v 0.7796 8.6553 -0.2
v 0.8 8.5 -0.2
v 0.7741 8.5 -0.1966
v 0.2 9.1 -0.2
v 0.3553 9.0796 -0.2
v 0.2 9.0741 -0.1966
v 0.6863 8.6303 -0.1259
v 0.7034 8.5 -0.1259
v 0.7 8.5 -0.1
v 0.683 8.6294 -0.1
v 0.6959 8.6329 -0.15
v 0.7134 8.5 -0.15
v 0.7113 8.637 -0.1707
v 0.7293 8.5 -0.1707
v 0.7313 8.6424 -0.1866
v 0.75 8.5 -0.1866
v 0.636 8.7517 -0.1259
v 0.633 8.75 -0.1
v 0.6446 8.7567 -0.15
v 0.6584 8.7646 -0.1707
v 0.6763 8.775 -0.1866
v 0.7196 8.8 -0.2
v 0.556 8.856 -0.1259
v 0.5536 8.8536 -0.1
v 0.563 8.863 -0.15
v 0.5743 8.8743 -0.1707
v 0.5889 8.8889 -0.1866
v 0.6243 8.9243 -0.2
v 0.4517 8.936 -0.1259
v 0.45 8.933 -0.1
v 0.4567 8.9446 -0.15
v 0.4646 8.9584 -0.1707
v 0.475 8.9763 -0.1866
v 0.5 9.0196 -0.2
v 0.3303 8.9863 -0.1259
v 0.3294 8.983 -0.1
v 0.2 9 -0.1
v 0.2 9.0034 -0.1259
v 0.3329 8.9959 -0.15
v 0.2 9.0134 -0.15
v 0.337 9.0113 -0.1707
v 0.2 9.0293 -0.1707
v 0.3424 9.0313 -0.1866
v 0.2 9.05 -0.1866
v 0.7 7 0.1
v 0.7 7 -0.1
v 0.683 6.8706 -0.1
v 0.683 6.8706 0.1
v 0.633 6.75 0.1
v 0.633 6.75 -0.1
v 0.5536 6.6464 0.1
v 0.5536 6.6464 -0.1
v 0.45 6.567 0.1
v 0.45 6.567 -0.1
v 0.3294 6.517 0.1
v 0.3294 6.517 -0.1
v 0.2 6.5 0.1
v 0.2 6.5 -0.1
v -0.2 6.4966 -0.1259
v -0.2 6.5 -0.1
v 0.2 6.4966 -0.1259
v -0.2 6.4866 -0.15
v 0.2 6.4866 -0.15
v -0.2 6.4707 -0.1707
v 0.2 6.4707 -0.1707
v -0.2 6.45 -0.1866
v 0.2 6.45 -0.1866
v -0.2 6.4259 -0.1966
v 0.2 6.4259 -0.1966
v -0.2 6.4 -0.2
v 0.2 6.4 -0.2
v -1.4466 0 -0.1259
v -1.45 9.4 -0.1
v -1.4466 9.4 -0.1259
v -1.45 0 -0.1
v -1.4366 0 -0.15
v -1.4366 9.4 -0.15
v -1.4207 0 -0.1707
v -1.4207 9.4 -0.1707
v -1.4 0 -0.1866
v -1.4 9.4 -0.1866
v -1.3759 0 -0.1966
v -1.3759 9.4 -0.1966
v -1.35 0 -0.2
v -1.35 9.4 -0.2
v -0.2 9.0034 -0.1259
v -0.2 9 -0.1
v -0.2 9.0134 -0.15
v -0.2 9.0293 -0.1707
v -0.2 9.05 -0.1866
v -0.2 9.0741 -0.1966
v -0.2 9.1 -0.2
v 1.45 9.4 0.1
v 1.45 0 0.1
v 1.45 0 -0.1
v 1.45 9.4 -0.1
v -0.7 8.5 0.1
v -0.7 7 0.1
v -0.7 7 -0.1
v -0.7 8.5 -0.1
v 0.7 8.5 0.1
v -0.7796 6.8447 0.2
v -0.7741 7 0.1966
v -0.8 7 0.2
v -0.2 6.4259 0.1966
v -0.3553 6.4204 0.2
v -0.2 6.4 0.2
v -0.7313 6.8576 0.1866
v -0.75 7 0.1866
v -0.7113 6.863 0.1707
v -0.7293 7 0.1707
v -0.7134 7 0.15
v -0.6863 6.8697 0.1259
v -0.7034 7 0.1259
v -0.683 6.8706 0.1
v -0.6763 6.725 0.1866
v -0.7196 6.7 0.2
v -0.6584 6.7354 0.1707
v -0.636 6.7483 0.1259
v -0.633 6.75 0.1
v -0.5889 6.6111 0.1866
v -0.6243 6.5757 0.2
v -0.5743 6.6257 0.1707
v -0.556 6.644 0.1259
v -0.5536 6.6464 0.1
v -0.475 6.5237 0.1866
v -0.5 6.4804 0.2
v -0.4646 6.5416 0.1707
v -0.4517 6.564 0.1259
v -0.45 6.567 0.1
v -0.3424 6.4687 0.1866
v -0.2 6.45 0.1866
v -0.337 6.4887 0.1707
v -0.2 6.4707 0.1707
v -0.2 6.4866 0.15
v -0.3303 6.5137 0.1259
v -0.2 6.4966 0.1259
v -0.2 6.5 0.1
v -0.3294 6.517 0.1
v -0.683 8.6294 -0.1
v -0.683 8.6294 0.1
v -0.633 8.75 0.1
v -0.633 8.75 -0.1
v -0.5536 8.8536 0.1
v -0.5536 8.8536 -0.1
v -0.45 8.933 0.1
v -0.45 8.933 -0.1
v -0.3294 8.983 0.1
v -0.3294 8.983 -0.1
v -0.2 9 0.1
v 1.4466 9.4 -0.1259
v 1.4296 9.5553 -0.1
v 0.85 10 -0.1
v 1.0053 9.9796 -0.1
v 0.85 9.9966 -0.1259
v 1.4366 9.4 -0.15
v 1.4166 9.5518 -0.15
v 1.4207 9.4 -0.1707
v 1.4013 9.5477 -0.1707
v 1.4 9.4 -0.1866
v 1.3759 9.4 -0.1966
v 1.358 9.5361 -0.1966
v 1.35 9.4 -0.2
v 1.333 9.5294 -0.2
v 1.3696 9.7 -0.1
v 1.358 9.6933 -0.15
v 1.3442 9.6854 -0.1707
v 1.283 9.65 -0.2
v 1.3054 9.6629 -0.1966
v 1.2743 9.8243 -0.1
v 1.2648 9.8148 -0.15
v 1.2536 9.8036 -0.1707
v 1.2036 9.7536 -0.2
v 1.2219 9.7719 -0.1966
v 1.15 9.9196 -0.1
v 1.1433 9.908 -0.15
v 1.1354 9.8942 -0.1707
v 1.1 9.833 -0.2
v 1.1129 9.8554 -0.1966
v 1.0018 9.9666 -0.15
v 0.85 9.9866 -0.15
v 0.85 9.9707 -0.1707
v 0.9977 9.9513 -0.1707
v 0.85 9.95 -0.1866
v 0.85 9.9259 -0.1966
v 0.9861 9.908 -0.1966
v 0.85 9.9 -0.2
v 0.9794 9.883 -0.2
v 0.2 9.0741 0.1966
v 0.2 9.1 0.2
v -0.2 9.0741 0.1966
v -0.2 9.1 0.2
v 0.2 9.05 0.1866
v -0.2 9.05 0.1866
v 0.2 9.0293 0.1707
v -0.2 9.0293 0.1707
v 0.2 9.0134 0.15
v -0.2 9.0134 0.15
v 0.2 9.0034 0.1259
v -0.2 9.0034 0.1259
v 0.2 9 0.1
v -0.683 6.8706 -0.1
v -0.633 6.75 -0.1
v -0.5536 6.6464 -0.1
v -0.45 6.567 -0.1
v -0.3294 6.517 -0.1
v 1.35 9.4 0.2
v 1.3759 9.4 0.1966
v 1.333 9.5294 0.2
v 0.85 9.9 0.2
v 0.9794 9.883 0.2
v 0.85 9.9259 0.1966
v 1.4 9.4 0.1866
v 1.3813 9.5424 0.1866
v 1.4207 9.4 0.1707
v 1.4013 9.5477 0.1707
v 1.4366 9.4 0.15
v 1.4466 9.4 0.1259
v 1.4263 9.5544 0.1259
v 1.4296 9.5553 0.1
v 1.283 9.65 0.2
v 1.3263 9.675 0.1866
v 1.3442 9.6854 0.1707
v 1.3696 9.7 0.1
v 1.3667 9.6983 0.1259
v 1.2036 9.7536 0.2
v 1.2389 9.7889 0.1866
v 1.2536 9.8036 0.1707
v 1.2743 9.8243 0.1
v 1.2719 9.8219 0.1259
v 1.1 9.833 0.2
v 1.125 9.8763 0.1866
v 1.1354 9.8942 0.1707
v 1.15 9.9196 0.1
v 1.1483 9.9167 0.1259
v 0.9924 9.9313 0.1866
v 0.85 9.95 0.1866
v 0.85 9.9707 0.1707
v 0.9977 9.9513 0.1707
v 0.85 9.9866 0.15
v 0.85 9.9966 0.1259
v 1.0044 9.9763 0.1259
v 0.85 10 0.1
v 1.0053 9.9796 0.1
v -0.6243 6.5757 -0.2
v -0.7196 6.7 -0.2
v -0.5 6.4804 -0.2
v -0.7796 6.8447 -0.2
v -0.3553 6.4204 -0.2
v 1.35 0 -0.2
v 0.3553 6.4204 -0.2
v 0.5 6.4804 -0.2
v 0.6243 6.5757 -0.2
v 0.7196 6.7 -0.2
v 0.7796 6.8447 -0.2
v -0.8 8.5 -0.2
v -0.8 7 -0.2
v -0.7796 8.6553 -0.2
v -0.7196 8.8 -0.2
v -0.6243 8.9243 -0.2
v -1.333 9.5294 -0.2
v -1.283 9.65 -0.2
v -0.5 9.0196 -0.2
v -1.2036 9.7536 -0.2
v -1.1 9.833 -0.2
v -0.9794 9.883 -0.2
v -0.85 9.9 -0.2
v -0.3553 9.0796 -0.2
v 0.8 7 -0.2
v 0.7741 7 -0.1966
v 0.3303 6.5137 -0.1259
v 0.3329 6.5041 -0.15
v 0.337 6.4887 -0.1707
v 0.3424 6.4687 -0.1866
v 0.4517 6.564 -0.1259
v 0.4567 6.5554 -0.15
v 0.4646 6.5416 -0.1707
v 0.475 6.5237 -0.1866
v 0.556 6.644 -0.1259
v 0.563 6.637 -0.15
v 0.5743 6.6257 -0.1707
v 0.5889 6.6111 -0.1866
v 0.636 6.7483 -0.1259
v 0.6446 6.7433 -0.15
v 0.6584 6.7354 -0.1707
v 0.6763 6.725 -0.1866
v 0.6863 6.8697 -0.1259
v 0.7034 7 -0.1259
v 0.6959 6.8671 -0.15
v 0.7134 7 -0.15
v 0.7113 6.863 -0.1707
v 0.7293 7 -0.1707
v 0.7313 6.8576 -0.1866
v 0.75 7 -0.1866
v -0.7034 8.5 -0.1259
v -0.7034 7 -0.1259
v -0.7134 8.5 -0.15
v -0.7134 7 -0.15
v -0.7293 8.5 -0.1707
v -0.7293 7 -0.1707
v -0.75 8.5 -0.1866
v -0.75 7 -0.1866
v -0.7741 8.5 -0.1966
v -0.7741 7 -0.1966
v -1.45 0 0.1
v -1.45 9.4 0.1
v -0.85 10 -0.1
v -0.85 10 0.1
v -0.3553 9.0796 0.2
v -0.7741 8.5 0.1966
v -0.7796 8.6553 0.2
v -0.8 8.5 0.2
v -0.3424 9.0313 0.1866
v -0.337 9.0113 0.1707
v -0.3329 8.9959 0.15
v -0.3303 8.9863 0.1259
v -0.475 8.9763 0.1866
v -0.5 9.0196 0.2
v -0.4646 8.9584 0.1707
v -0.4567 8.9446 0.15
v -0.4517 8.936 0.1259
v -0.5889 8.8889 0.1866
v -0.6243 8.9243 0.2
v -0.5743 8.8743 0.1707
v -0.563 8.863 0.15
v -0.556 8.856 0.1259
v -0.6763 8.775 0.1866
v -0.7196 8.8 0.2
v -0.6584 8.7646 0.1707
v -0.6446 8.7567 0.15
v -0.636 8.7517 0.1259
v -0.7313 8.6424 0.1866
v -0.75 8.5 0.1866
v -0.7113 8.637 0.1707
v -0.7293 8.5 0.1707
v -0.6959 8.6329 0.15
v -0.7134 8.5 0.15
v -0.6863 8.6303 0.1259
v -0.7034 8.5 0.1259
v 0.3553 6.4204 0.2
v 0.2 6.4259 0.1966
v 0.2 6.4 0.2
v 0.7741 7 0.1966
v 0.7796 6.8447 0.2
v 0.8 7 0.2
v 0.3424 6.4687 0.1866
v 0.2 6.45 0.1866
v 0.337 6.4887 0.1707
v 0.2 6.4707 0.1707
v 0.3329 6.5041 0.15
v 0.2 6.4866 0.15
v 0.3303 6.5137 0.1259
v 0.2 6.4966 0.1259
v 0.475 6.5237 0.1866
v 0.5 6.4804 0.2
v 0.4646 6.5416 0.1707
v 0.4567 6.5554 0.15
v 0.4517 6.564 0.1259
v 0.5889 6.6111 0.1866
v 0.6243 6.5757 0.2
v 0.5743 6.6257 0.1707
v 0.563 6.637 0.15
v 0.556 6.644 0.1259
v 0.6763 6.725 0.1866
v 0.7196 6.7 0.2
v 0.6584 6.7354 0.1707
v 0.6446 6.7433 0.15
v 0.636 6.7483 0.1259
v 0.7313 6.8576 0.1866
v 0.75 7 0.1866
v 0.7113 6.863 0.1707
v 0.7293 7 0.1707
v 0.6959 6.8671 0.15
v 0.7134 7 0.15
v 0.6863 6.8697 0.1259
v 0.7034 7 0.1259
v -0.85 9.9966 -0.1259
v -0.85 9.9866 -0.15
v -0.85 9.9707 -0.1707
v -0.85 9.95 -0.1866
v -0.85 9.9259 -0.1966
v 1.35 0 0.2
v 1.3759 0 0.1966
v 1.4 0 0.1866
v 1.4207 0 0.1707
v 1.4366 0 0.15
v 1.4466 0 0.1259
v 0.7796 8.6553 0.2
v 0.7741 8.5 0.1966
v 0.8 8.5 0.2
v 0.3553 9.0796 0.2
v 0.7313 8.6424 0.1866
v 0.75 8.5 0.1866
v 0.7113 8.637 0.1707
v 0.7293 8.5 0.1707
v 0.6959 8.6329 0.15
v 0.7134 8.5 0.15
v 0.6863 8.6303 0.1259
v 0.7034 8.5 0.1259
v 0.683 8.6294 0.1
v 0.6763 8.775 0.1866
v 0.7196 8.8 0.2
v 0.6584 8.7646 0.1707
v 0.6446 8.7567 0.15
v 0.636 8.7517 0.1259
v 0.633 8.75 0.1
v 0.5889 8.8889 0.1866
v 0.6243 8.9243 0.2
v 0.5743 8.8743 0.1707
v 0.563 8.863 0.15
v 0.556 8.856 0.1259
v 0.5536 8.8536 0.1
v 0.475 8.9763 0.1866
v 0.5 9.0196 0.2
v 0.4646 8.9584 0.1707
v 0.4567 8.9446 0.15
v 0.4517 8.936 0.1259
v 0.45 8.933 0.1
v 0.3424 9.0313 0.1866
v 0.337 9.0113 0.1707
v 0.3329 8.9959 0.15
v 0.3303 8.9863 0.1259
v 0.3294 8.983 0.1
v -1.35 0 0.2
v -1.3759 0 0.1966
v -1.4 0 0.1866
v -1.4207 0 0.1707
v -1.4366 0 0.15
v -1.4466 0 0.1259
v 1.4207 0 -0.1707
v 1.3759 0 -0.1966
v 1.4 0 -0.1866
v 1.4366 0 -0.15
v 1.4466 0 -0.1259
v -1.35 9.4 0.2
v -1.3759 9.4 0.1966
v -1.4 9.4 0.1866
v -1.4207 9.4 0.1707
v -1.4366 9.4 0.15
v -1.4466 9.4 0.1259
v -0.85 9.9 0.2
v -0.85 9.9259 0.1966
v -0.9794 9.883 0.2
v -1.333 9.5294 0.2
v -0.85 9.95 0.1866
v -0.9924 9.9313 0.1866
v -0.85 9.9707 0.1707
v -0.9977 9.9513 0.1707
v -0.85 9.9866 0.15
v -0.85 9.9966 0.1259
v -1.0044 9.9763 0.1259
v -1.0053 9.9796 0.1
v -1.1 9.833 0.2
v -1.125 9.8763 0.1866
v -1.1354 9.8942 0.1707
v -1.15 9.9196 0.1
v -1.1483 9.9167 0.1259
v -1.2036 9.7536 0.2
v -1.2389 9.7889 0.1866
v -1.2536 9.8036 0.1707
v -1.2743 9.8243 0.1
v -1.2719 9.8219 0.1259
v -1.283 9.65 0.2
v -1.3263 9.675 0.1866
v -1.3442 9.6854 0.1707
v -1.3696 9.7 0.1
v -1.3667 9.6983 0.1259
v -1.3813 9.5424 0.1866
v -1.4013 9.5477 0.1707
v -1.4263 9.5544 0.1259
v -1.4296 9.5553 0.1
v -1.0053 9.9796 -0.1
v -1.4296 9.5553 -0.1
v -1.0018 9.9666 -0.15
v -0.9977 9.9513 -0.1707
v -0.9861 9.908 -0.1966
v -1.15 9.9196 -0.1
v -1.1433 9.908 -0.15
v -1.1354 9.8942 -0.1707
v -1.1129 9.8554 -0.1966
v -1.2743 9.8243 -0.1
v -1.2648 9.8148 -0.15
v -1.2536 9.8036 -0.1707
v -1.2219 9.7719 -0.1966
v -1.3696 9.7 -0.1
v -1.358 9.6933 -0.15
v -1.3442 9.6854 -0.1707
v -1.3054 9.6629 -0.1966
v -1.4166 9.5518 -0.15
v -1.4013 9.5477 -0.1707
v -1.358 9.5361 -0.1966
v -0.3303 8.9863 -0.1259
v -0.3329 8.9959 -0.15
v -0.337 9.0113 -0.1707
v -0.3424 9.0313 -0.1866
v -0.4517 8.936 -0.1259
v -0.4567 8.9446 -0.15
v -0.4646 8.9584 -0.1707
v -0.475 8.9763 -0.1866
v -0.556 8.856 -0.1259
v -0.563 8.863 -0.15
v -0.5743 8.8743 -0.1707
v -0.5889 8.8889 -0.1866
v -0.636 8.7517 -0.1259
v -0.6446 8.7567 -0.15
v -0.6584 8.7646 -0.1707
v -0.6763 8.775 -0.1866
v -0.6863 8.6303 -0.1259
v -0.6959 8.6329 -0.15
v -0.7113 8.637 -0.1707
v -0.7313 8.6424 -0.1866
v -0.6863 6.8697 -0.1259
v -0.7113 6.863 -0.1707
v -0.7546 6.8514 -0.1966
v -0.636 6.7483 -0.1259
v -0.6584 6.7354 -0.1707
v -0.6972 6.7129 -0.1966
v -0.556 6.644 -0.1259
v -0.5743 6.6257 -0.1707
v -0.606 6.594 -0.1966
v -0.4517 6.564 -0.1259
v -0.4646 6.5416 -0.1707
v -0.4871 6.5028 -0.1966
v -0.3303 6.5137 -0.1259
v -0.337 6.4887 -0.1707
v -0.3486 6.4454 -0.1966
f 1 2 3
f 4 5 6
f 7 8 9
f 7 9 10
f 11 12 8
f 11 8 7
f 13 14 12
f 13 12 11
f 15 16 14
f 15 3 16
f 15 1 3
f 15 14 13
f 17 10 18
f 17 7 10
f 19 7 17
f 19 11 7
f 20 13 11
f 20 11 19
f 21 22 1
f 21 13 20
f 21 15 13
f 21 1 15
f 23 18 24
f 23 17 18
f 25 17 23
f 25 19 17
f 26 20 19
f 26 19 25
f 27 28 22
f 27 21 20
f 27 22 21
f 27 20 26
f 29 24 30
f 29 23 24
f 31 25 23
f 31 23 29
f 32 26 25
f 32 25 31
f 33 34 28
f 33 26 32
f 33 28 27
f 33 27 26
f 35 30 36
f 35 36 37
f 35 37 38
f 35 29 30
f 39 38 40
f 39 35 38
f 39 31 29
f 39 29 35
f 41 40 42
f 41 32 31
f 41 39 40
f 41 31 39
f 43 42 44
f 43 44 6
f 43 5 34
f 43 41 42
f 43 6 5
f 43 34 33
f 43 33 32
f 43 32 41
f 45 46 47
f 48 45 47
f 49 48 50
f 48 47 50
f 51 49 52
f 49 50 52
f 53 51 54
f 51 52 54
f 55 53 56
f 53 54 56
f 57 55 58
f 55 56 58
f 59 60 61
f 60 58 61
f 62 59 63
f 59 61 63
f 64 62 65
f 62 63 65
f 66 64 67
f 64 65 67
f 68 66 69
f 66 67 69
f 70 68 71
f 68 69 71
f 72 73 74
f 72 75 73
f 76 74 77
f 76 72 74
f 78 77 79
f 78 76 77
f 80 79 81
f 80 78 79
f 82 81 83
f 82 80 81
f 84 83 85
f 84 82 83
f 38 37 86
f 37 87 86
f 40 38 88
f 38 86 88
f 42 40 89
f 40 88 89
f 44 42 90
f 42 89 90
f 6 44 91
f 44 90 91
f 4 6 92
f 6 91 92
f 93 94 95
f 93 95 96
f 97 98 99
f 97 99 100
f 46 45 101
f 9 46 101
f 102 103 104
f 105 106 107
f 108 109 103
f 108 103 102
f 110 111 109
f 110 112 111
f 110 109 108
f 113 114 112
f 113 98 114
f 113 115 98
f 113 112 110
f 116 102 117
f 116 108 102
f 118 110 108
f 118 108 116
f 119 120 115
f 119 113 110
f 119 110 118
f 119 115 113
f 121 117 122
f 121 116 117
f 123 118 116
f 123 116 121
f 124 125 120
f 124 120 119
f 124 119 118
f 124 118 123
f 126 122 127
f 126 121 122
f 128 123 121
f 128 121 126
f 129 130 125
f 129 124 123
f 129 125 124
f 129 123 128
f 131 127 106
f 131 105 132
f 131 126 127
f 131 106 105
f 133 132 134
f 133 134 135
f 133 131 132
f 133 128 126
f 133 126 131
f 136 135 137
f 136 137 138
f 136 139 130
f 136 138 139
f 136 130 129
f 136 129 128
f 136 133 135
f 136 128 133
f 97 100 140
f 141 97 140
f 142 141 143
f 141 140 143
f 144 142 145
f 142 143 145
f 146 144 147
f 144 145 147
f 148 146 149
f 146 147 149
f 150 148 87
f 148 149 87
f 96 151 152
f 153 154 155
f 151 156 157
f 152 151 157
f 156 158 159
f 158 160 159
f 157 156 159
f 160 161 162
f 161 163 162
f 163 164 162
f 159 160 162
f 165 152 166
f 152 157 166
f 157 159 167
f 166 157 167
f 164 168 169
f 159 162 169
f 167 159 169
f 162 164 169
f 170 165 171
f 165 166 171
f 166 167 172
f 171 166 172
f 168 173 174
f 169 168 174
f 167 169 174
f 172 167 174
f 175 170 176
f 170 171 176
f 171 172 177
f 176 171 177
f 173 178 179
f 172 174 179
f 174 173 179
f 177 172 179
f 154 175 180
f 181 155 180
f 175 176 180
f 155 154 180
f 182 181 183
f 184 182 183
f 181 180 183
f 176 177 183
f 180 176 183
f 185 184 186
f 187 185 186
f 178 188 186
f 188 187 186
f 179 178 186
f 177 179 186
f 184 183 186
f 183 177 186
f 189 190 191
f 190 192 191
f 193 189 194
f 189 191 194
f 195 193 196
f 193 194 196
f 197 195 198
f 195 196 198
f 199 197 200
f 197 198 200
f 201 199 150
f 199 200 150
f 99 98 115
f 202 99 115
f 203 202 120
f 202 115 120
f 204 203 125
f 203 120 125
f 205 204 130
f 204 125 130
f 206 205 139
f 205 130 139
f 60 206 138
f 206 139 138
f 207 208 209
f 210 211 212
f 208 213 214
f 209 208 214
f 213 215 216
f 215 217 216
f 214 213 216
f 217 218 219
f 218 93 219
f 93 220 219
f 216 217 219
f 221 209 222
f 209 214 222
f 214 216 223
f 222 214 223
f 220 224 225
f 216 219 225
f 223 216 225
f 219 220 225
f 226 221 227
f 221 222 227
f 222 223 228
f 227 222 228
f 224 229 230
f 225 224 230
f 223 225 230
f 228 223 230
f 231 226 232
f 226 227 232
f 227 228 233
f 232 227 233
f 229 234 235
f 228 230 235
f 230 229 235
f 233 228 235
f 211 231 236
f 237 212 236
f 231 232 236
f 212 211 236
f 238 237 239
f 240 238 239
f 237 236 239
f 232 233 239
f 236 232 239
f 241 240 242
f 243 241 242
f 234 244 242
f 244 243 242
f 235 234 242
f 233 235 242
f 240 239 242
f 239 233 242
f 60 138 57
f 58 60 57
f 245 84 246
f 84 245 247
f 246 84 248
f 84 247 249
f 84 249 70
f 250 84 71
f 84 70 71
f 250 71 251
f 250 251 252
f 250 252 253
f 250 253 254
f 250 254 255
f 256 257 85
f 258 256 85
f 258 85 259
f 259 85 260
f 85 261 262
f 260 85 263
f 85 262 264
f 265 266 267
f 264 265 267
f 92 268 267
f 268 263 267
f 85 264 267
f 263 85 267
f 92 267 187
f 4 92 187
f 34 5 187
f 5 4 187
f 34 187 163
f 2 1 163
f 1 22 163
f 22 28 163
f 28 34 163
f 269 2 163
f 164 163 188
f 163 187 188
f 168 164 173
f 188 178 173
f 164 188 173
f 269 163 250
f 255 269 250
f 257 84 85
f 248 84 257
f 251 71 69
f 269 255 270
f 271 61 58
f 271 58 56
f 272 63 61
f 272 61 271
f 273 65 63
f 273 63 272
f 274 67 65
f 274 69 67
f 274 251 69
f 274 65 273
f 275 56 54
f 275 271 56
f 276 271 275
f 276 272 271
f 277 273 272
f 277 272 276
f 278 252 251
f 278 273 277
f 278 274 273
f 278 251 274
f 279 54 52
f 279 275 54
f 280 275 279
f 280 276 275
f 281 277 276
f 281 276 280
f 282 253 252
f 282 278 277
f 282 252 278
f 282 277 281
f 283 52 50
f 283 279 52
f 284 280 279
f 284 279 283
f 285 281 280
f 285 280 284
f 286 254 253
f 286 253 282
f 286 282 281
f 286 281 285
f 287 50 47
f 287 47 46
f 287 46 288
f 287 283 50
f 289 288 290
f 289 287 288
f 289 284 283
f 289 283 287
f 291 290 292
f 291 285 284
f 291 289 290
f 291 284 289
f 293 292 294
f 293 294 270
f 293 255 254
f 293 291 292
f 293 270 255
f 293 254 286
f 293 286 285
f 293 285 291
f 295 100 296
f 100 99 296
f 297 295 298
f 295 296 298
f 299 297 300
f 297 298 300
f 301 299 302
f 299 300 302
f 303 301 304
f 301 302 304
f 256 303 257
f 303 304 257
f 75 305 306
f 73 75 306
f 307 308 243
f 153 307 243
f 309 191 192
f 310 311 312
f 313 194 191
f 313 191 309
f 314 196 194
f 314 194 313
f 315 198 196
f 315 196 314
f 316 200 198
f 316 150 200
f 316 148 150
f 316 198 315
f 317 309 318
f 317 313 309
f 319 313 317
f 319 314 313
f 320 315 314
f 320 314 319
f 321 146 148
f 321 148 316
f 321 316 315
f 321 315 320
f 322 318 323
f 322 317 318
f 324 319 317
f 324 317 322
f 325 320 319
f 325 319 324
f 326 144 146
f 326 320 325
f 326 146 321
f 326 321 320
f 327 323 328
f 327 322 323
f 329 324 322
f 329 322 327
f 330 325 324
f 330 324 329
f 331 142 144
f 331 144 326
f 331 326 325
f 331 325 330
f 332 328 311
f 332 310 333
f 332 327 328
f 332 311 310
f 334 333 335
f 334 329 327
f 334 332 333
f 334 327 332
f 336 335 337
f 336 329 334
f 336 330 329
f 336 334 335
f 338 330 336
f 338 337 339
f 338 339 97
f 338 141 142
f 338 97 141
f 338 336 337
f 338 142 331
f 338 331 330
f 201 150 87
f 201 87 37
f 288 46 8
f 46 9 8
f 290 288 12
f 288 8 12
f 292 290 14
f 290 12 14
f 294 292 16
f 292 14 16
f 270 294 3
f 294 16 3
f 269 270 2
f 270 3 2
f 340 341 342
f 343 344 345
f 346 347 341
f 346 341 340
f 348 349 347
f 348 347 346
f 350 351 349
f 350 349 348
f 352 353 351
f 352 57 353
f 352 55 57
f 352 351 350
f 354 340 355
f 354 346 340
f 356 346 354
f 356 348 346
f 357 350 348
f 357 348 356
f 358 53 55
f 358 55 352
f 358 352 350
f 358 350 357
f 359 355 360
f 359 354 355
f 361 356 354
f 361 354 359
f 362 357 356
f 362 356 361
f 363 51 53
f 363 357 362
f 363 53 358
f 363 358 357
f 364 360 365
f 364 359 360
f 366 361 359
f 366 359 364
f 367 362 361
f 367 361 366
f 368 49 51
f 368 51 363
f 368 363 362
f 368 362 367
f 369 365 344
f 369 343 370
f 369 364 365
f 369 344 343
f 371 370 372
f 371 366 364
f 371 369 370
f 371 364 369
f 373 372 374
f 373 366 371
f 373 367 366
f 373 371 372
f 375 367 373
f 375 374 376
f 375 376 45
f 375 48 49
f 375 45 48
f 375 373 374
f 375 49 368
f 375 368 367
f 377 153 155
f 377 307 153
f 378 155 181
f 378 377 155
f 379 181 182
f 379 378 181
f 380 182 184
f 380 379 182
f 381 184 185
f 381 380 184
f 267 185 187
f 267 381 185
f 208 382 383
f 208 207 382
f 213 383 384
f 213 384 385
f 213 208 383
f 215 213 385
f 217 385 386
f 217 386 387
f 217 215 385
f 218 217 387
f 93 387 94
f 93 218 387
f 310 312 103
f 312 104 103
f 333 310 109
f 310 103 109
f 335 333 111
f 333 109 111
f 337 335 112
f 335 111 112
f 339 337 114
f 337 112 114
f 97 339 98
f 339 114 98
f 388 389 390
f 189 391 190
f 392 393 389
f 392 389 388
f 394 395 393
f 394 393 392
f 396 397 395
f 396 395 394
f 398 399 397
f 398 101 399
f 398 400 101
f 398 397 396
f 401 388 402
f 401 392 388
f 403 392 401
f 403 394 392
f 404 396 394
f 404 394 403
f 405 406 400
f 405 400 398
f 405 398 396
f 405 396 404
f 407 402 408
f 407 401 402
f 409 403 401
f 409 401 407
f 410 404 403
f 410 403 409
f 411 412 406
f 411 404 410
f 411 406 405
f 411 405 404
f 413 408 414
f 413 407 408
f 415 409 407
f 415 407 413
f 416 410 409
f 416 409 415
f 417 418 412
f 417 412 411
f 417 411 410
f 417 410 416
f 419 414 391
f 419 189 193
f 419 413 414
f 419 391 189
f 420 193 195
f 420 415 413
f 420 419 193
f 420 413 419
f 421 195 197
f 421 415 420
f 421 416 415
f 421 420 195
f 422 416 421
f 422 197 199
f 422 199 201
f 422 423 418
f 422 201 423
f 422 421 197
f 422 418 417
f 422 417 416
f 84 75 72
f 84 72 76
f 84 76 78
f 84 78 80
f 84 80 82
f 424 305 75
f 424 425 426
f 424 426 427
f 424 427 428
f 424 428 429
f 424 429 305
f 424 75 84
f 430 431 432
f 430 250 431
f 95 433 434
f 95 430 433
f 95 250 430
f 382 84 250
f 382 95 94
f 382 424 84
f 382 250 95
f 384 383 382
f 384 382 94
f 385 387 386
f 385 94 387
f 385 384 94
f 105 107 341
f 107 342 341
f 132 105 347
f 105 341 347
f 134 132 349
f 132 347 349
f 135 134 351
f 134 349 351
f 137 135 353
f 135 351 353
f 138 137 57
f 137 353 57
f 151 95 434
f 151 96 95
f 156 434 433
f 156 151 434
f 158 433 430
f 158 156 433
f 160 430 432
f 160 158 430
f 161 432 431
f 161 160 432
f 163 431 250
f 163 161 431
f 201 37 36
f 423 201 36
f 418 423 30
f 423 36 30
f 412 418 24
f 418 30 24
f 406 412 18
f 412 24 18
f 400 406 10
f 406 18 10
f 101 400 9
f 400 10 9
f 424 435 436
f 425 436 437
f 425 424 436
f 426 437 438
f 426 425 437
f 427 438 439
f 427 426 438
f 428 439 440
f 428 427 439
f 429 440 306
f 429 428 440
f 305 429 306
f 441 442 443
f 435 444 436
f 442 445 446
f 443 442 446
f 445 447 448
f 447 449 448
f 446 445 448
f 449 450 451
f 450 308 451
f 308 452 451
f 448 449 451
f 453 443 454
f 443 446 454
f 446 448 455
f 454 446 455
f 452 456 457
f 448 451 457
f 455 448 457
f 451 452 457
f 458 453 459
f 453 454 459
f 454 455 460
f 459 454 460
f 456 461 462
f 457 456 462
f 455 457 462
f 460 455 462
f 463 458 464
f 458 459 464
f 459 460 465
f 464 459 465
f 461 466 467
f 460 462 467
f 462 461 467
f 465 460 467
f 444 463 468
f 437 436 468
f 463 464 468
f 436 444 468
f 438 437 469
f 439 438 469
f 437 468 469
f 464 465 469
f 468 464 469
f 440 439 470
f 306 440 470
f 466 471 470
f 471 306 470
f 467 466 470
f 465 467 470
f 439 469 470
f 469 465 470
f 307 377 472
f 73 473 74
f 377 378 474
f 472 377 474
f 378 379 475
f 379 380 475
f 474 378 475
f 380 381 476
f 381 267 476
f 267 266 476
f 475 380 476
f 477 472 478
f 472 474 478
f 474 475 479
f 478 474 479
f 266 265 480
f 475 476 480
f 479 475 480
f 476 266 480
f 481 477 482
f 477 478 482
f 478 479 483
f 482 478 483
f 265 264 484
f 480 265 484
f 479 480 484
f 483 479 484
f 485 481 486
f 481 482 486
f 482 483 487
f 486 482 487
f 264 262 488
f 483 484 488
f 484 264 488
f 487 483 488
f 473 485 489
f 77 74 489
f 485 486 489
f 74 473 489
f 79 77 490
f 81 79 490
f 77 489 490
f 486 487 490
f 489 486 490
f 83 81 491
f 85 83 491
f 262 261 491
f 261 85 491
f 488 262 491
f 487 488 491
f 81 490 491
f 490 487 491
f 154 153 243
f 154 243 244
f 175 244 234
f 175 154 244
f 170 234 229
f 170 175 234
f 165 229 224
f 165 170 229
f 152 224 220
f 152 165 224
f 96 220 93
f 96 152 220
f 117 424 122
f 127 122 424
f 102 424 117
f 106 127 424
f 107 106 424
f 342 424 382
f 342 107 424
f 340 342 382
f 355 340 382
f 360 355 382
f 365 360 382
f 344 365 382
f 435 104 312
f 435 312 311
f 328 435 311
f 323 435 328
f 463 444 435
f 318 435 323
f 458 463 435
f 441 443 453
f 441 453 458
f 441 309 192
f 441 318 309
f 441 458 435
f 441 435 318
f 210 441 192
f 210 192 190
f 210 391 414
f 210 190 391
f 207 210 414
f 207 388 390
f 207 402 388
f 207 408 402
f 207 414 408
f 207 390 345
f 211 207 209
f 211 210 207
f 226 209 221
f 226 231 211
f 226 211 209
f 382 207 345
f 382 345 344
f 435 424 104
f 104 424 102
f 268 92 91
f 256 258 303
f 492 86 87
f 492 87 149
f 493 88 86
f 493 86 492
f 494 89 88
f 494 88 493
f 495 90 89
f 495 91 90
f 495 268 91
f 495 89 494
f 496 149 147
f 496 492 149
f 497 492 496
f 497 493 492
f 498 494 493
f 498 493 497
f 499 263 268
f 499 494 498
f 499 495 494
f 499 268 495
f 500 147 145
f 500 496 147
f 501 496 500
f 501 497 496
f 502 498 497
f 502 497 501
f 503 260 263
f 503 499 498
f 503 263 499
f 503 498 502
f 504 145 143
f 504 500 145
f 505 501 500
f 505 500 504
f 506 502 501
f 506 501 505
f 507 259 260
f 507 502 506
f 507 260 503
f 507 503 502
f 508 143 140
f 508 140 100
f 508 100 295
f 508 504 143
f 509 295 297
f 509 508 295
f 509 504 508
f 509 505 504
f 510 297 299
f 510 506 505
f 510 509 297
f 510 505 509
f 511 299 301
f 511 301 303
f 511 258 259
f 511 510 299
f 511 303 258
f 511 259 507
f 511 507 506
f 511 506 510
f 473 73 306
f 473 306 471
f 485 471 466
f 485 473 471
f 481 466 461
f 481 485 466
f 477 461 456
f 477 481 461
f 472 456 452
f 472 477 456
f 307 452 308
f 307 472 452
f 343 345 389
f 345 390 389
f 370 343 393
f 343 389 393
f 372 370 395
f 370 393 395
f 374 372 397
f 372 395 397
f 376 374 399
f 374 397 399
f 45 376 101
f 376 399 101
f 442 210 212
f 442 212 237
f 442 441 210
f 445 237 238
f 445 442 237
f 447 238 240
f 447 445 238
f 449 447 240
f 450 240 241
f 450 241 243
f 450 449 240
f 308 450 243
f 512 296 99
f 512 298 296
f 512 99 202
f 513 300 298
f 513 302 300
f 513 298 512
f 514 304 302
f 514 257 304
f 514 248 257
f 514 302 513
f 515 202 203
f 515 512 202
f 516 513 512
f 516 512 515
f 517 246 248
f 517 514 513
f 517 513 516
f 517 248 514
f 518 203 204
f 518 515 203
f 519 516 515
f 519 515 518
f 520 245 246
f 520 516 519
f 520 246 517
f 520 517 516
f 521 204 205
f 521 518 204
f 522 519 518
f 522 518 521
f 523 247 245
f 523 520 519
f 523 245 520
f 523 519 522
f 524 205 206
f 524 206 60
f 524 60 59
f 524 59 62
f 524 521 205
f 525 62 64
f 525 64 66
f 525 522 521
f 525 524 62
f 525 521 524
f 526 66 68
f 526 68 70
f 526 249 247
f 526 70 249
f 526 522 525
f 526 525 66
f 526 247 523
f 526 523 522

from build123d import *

# Parameters (mm, degrees)
SKETCH1_W      = 2.9
SKETCH1_H      = 10
SKETCH1_W_2    = 1.4
SKETCH1_H_2    = 2.5
EXTRUDE1_DEPTH = 0.2
FILLET1_R      = 0.5
FILLET2_R      = 0.6
FILLET3_R      = 0.1


with BuildPart() as part:
    # Sketch1 → Extrude1 (new body, symmetric)
    with BuildSketch(Plane.XY):
        with Locations((0, 5)):
            Rectangle(SKETCH1_W, SKETCH1_H)
        with Locations((0, 7.75)):
            Rectangle(SKETCH1_W_2, SKETCH1_H_2, mode=Mode.SUBTRACT)
    extrude(amount=EXTRUDE1_DEPTH, both=True)

    # Fillet1
    fillet1_edges = [part.edges().sort_by_distance(p)[0] for p in [
        (-0.7, 9, 0),
        (-0.7, 6.5, 0),
        (0.7, 6.5, 0),
        (0.7, 9, 0),
    ]]
    fillet(fillet1_edges, radius=FILLET1_R)

    # Fillet2
    fillet2_edges = [part.edges().sort_by_distance(p)[0] for p in [
        (-1.45, 10, 0),
        (1.45, 10, 0),
    ]]
    fillet(fillet2_edges, radius=FILLET2_R)

    # Fillet3
    fillet3_edges = [part.edges().sort_by_distance(p)[0] for p in [
        (1.45, 4.7, 0.2),
        (0, 6.5, -0.2),
        (0, 6.5, 0.2),
        (0.7, 7.75, -0.2),
        (0.7, 7.75, 0.2),
        (0, 9, -0.2),
        (0, 9, 0.2),
        (-0.7, 7.75, -0.2),
        (-0.7, 7.75, 0.2),
        (0.553553391, 6.646446609, -0.2),
        (0.553553391, 6.646446609, 0.2),
        (0.553553391, 8.853553391, -0.2),
        (0.553553391, 8.853553391, 0.2),
        (-0.553553391, 8.853553391, -0.2),
        (-0.553553391, 8.853553391, 0.2),
        (-0.553553391, 6.646446609, -0.2),
        (-0.553553391, 6.646446609, 0.2),
        (1.45, 4.7, -0.2),
        (0, 10, -0.2),
        (0, 10, 0.2),
        (-1.45, 4.7, -0.2),
        (-1.274264069, 9.824264069, -0.2),
        (1.274264069, 9.824264069, -0.2),
        (-1.45, 4.7, 0.2),
        (-1.274264069, 9.824264069, 0.2),
        (1.274264069, 9.824264069, 0.2),
    ]]
    fillet(fillet3_edges, radius=FILLET3_R)


solid = part.part
